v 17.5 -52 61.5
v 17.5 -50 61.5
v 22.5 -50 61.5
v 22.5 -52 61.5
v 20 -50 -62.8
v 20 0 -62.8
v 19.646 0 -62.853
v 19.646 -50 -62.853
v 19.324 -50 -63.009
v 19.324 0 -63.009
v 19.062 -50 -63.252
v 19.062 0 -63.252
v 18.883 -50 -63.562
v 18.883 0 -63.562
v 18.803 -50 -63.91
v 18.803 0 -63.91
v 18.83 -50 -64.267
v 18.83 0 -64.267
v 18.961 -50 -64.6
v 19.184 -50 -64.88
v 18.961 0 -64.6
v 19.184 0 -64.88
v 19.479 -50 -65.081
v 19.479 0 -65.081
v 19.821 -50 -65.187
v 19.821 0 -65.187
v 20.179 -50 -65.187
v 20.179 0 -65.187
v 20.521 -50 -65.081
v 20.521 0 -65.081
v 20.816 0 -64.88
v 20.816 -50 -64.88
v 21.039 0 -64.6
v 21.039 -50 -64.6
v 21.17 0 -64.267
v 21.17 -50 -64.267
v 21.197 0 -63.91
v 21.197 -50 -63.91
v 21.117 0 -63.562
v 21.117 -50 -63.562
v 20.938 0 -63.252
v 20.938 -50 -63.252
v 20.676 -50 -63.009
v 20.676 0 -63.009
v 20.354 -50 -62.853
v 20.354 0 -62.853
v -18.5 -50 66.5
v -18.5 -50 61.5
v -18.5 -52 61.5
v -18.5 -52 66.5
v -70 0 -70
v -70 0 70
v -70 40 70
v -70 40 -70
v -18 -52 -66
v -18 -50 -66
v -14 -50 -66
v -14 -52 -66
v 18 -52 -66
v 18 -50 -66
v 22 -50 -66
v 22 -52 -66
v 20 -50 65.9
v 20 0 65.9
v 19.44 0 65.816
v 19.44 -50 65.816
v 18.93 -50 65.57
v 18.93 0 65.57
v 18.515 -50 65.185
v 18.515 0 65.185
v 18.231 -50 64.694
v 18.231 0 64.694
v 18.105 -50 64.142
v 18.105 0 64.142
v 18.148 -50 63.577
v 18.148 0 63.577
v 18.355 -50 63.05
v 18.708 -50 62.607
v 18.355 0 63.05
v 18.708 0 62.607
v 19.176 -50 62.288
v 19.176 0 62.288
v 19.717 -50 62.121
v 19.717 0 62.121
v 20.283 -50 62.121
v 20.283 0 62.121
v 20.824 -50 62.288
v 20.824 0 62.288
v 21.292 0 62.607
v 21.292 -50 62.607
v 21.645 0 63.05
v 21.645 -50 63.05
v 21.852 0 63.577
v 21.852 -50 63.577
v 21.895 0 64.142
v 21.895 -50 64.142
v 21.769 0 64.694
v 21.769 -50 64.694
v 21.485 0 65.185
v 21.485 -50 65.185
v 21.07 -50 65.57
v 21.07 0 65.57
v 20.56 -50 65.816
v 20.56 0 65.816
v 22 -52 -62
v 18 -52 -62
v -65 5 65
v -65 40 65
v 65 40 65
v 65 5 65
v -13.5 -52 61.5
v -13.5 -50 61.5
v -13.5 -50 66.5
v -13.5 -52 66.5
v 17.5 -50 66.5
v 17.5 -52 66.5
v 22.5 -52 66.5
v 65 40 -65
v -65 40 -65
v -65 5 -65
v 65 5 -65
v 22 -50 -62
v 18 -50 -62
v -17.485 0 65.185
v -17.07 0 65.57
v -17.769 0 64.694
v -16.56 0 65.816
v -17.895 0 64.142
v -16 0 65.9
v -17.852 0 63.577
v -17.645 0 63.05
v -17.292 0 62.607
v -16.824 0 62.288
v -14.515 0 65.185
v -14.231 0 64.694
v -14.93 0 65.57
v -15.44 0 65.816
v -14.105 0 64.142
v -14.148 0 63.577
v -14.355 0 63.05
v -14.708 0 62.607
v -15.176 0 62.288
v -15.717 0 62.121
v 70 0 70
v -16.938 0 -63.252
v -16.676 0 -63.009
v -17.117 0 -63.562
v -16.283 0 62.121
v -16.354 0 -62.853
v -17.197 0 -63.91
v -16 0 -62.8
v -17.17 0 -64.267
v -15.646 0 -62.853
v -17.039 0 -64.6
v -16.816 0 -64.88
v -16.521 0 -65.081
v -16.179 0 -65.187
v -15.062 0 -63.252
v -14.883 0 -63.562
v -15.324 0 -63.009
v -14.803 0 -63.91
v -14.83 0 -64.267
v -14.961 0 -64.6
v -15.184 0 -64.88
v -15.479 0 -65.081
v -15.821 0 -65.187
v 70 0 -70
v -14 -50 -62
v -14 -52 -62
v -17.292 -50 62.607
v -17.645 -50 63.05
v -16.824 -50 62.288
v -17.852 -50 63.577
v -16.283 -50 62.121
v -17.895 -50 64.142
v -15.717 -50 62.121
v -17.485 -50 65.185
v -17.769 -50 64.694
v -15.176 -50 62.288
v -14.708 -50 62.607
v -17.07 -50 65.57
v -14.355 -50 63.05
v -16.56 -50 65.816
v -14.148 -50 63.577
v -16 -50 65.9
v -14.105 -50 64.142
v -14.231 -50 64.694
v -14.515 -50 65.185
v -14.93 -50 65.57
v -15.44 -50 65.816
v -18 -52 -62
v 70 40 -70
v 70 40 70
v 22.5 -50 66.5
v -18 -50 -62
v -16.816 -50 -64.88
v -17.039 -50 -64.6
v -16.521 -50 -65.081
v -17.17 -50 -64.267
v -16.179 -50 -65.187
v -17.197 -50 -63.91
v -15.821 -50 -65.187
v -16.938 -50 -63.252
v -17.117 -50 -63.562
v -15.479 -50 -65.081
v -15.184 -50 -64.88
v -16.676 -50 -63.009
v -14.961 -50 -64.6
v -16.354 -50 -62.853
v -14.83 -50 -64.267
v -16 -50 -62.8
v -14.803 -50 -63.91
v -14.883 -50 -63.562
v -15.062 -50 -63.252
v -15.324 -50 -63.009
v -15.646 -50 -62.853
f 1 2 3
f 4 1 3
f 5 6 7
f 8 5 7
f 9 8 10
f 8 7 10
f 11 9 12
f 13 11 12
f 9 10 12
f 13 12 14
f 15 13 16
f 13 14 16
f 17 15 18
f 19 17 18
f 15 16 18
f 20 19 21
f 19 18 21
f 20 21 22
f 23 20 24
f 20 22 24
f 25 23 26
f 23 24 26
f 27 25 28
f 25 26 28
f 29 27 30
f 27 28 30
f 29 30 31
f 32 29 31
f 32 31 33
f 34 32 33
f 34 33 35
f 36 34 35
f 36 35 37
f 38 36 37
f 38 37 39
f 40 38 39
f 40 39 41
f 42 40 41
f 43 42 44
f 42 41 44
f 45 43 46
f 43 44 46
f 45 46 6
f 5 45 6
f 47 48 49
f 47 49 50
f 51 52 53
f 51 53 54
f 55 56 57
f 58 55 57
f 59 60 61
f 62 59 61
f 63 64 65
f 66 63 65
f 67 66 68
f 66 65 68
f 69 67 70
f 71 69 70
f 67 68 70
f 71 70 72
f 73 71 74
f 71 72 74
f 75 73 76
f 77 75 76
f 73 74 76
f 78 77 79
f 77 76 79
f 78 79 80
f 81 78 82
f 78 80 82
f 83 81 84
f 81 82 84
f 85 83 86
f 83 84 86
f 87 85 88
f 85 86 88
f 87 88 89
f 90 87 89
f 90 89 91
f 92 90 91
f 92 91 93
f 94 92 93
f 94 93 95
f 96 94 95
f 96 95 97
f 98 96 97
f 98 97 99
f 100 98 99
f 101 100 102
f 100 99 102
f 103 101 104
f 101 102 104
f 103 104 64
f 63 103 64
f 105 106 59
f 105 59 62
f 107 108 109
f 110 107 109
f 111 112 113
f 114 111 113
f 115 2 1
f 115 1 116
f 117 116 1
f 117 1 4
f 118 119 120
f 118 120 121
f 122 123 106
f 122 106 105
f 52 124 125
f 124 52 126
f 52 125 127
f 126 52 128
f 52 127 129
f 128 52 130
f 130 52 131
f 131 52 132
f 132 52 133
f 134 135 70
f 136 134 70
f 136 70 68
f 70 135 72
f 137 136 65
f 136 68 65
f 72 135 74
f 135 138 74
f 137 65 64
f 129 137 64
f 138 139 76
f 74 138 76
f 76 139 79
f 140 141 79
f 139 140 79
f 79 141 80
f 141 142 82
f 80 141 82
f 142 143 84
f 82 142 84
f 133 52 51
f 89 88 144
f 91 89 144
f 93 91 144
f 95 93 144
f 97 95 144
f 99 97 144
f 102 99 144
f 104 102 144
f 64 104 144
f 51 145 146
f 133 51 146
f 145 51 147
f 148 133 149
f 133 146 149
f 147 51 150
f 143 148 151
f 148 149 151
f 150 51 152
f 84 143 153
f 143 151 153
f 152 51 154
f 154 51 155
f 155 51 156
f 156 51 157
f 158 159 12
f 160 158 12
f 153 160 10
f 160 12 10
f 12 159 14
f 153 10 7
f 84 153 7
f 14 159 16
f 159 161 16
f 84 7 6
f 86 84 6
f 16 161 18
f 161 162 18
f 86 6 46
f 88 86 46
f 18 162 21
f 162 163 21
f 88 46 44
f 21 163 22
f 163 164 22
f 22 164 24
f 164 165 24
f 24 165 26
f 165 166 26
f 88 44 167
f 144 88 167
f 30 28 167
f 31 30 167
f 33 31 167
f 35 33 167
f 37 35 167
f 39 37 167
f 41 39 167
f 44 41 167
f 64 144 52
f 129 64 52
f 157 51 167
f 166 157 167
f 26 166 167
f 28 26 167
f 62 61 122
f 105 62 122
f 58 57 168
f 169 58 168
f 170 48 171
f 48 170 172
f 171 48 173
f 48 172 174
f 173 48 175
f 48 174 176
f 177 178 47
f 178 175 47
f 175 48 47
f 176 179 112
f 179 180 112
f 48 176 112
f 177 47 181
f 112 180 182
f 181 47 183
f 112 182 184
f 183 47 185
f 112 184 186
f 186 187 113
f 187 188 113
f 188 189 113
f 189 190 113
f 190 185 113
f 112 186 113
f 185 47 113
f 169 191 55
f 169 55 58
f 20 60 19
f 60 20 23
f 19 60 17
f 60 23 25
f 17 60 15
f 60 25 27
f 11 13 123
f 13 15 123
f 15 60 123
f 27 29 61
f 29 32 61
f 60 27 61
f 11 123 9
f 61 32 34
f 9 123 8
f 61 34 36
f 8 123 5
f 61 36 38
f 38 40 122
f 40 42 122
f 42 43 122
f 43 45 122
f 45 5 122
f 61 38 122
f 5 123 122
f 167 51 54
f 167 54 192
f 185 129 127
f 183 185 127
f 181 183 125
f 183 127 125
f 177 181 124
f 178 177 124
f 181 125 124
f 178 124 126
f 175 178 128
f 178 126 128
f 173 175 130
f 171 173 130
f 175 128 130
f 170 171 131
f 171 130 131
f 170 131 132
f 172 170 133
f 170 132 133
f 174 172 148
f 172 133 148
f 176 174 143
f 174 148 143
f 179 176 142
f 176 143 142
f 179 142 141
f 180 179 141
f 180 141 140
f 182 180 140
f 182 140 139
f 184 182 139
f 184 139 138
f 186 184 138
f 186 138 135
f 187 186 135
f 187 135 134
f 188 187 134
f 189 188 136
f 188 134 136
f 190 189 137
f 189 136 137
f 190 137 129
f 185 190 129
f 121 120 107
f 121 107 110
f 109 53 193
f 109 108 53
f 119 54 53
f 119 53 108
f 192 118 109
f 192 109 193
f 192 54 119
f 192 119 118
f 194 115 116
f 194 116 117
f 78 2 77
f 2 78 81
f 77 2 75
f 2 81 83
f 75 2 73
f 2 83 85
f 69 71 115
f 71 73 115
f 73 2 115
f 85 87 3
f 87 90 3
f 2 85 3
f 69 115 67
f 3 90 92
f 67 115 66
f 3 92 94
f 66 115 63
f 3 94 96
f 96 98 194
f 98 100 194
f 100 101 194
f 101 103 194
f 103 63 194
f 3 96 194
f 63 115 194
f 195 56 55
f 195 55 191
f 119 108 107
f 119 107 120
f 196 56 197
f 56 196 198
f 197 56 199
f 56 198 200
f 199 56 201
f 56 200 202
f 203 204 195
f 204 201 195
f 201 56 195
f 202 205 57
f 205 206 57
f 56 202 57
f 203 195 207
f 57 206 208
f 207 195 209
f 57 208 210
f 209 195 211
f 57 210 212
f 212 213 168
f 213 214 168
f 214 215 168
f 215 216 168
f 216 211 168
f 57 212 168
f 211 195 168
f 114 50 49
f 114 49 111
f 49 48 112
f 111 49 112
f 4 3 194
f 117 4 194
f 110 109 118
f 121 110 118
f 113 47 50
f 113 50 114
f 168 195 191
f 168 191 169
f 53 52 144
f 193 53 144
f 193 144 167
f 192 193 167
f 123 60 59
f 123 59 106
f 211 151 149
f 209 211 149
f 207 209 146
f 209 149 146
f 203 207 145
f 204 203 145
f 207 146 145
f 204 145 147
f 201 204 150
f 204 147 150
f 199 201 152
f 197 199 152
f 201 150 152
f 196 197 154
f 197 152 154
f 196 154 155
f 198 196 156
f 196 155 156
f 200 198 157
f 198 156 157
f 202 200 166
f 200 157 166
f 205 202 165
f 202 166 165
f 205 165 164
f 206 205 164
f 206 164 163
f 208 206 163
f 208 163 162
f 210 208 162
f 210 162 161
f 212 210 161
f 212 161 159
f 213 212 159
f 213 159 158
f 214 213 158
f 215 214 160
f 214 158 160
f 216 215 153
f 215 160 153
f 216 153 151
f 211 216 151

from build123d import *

# Parameters (mm, degrees)
CROQUIS1_W              = 140
CROQUIS1_H              = 140
SALIENTE_EXTRUIR1_DEPTH = 40
CROQUIS3_W              = 130
CROQUIS3_H              = 130
CORTAR_EXTRUIR1_DEPTH   = 35
CROQUIS5_R              = 1.2
CROQUIS5_R_2            = 1.9
SALIENTE_EXTRUIR4_DEPTH = 50
CROQUIS6_W              = 5
CROQUIS6_H              = 5
CROQUIS6_W_2            = 4
CROQUIS6_H_2            = 4
SALIENTE_EXTRUIR5_DEPTH = 2


with BuildPart() as part:
    # Croquis1 → Saliente-Extruir1 (new body)
    with BuildSketch(Plane(origin=(0, 0, 0), x_dir=(1, 0, 0), z_dir=(0, 1, 0))):
        Rectangle(CROQUIS1_W, CROQUIS1_H)
    extrude(amount=SALIENTE_EXTRUIR1_DEPTH)

    # Croquis3 → Cortar-Extruir1 (cut)
    with BuildSketch(Plane(origin=(0, 40, 0), x_dir=(1, 0, 0), z_dir=(0, 1, 0))):
        Rectangle(CROQUIS3_W, CROQUIS3_H)
    extrude(amount=-CORTAR_EXTRUIR1_DEPTH, mode=Mode.SUBTRACT)

    # Croquis5 → Saliente-Extruir4 (add)
    with BuildSketch(Plane.XZ):
        with Locations(Location((-16, -64, 0), (0, 0, 90))):
            Circle(CROQUIS5_R)
        with Locations(Location((-16, 64, 0), (0, 0, 90))):
            Circle(CROQUIS5_R_2)
        with Locations(Location((20, 64, 0), (0, 0, 90))):
            Circle(CROQUIS5_R_2)
        with Locations(Location((20, -64, 0), (0, 0, 90))):
            Circle(CROQUIS5_R)
    extrude(amount=SALIENTE_EXTRUIR4_DEPTH)

    # Croquis6 → Saliente-Extruir5 (add)
    with BuildSketch(Plane.XZ.offset(50)):
        with Locations((-16, 64)):
            Rectangle(CROQUIS6_W, CROQUIS6_H)
        with Locations((20, 64)):
            Rectangle(CROQUIS6_W, CROQUIS6_H)
        with Locations((-16, -64)):
            Rectangle(CROQUIS6_W_2, CROQUIS6_H_2)
        with Locations((20, -64)):
            Rectangle(CROQUIS6_W_2, CROQUIS6_H_2)
    extrude(amount=SALIENTE_EXTRUIR5_DEPTH)


solid = part.part
